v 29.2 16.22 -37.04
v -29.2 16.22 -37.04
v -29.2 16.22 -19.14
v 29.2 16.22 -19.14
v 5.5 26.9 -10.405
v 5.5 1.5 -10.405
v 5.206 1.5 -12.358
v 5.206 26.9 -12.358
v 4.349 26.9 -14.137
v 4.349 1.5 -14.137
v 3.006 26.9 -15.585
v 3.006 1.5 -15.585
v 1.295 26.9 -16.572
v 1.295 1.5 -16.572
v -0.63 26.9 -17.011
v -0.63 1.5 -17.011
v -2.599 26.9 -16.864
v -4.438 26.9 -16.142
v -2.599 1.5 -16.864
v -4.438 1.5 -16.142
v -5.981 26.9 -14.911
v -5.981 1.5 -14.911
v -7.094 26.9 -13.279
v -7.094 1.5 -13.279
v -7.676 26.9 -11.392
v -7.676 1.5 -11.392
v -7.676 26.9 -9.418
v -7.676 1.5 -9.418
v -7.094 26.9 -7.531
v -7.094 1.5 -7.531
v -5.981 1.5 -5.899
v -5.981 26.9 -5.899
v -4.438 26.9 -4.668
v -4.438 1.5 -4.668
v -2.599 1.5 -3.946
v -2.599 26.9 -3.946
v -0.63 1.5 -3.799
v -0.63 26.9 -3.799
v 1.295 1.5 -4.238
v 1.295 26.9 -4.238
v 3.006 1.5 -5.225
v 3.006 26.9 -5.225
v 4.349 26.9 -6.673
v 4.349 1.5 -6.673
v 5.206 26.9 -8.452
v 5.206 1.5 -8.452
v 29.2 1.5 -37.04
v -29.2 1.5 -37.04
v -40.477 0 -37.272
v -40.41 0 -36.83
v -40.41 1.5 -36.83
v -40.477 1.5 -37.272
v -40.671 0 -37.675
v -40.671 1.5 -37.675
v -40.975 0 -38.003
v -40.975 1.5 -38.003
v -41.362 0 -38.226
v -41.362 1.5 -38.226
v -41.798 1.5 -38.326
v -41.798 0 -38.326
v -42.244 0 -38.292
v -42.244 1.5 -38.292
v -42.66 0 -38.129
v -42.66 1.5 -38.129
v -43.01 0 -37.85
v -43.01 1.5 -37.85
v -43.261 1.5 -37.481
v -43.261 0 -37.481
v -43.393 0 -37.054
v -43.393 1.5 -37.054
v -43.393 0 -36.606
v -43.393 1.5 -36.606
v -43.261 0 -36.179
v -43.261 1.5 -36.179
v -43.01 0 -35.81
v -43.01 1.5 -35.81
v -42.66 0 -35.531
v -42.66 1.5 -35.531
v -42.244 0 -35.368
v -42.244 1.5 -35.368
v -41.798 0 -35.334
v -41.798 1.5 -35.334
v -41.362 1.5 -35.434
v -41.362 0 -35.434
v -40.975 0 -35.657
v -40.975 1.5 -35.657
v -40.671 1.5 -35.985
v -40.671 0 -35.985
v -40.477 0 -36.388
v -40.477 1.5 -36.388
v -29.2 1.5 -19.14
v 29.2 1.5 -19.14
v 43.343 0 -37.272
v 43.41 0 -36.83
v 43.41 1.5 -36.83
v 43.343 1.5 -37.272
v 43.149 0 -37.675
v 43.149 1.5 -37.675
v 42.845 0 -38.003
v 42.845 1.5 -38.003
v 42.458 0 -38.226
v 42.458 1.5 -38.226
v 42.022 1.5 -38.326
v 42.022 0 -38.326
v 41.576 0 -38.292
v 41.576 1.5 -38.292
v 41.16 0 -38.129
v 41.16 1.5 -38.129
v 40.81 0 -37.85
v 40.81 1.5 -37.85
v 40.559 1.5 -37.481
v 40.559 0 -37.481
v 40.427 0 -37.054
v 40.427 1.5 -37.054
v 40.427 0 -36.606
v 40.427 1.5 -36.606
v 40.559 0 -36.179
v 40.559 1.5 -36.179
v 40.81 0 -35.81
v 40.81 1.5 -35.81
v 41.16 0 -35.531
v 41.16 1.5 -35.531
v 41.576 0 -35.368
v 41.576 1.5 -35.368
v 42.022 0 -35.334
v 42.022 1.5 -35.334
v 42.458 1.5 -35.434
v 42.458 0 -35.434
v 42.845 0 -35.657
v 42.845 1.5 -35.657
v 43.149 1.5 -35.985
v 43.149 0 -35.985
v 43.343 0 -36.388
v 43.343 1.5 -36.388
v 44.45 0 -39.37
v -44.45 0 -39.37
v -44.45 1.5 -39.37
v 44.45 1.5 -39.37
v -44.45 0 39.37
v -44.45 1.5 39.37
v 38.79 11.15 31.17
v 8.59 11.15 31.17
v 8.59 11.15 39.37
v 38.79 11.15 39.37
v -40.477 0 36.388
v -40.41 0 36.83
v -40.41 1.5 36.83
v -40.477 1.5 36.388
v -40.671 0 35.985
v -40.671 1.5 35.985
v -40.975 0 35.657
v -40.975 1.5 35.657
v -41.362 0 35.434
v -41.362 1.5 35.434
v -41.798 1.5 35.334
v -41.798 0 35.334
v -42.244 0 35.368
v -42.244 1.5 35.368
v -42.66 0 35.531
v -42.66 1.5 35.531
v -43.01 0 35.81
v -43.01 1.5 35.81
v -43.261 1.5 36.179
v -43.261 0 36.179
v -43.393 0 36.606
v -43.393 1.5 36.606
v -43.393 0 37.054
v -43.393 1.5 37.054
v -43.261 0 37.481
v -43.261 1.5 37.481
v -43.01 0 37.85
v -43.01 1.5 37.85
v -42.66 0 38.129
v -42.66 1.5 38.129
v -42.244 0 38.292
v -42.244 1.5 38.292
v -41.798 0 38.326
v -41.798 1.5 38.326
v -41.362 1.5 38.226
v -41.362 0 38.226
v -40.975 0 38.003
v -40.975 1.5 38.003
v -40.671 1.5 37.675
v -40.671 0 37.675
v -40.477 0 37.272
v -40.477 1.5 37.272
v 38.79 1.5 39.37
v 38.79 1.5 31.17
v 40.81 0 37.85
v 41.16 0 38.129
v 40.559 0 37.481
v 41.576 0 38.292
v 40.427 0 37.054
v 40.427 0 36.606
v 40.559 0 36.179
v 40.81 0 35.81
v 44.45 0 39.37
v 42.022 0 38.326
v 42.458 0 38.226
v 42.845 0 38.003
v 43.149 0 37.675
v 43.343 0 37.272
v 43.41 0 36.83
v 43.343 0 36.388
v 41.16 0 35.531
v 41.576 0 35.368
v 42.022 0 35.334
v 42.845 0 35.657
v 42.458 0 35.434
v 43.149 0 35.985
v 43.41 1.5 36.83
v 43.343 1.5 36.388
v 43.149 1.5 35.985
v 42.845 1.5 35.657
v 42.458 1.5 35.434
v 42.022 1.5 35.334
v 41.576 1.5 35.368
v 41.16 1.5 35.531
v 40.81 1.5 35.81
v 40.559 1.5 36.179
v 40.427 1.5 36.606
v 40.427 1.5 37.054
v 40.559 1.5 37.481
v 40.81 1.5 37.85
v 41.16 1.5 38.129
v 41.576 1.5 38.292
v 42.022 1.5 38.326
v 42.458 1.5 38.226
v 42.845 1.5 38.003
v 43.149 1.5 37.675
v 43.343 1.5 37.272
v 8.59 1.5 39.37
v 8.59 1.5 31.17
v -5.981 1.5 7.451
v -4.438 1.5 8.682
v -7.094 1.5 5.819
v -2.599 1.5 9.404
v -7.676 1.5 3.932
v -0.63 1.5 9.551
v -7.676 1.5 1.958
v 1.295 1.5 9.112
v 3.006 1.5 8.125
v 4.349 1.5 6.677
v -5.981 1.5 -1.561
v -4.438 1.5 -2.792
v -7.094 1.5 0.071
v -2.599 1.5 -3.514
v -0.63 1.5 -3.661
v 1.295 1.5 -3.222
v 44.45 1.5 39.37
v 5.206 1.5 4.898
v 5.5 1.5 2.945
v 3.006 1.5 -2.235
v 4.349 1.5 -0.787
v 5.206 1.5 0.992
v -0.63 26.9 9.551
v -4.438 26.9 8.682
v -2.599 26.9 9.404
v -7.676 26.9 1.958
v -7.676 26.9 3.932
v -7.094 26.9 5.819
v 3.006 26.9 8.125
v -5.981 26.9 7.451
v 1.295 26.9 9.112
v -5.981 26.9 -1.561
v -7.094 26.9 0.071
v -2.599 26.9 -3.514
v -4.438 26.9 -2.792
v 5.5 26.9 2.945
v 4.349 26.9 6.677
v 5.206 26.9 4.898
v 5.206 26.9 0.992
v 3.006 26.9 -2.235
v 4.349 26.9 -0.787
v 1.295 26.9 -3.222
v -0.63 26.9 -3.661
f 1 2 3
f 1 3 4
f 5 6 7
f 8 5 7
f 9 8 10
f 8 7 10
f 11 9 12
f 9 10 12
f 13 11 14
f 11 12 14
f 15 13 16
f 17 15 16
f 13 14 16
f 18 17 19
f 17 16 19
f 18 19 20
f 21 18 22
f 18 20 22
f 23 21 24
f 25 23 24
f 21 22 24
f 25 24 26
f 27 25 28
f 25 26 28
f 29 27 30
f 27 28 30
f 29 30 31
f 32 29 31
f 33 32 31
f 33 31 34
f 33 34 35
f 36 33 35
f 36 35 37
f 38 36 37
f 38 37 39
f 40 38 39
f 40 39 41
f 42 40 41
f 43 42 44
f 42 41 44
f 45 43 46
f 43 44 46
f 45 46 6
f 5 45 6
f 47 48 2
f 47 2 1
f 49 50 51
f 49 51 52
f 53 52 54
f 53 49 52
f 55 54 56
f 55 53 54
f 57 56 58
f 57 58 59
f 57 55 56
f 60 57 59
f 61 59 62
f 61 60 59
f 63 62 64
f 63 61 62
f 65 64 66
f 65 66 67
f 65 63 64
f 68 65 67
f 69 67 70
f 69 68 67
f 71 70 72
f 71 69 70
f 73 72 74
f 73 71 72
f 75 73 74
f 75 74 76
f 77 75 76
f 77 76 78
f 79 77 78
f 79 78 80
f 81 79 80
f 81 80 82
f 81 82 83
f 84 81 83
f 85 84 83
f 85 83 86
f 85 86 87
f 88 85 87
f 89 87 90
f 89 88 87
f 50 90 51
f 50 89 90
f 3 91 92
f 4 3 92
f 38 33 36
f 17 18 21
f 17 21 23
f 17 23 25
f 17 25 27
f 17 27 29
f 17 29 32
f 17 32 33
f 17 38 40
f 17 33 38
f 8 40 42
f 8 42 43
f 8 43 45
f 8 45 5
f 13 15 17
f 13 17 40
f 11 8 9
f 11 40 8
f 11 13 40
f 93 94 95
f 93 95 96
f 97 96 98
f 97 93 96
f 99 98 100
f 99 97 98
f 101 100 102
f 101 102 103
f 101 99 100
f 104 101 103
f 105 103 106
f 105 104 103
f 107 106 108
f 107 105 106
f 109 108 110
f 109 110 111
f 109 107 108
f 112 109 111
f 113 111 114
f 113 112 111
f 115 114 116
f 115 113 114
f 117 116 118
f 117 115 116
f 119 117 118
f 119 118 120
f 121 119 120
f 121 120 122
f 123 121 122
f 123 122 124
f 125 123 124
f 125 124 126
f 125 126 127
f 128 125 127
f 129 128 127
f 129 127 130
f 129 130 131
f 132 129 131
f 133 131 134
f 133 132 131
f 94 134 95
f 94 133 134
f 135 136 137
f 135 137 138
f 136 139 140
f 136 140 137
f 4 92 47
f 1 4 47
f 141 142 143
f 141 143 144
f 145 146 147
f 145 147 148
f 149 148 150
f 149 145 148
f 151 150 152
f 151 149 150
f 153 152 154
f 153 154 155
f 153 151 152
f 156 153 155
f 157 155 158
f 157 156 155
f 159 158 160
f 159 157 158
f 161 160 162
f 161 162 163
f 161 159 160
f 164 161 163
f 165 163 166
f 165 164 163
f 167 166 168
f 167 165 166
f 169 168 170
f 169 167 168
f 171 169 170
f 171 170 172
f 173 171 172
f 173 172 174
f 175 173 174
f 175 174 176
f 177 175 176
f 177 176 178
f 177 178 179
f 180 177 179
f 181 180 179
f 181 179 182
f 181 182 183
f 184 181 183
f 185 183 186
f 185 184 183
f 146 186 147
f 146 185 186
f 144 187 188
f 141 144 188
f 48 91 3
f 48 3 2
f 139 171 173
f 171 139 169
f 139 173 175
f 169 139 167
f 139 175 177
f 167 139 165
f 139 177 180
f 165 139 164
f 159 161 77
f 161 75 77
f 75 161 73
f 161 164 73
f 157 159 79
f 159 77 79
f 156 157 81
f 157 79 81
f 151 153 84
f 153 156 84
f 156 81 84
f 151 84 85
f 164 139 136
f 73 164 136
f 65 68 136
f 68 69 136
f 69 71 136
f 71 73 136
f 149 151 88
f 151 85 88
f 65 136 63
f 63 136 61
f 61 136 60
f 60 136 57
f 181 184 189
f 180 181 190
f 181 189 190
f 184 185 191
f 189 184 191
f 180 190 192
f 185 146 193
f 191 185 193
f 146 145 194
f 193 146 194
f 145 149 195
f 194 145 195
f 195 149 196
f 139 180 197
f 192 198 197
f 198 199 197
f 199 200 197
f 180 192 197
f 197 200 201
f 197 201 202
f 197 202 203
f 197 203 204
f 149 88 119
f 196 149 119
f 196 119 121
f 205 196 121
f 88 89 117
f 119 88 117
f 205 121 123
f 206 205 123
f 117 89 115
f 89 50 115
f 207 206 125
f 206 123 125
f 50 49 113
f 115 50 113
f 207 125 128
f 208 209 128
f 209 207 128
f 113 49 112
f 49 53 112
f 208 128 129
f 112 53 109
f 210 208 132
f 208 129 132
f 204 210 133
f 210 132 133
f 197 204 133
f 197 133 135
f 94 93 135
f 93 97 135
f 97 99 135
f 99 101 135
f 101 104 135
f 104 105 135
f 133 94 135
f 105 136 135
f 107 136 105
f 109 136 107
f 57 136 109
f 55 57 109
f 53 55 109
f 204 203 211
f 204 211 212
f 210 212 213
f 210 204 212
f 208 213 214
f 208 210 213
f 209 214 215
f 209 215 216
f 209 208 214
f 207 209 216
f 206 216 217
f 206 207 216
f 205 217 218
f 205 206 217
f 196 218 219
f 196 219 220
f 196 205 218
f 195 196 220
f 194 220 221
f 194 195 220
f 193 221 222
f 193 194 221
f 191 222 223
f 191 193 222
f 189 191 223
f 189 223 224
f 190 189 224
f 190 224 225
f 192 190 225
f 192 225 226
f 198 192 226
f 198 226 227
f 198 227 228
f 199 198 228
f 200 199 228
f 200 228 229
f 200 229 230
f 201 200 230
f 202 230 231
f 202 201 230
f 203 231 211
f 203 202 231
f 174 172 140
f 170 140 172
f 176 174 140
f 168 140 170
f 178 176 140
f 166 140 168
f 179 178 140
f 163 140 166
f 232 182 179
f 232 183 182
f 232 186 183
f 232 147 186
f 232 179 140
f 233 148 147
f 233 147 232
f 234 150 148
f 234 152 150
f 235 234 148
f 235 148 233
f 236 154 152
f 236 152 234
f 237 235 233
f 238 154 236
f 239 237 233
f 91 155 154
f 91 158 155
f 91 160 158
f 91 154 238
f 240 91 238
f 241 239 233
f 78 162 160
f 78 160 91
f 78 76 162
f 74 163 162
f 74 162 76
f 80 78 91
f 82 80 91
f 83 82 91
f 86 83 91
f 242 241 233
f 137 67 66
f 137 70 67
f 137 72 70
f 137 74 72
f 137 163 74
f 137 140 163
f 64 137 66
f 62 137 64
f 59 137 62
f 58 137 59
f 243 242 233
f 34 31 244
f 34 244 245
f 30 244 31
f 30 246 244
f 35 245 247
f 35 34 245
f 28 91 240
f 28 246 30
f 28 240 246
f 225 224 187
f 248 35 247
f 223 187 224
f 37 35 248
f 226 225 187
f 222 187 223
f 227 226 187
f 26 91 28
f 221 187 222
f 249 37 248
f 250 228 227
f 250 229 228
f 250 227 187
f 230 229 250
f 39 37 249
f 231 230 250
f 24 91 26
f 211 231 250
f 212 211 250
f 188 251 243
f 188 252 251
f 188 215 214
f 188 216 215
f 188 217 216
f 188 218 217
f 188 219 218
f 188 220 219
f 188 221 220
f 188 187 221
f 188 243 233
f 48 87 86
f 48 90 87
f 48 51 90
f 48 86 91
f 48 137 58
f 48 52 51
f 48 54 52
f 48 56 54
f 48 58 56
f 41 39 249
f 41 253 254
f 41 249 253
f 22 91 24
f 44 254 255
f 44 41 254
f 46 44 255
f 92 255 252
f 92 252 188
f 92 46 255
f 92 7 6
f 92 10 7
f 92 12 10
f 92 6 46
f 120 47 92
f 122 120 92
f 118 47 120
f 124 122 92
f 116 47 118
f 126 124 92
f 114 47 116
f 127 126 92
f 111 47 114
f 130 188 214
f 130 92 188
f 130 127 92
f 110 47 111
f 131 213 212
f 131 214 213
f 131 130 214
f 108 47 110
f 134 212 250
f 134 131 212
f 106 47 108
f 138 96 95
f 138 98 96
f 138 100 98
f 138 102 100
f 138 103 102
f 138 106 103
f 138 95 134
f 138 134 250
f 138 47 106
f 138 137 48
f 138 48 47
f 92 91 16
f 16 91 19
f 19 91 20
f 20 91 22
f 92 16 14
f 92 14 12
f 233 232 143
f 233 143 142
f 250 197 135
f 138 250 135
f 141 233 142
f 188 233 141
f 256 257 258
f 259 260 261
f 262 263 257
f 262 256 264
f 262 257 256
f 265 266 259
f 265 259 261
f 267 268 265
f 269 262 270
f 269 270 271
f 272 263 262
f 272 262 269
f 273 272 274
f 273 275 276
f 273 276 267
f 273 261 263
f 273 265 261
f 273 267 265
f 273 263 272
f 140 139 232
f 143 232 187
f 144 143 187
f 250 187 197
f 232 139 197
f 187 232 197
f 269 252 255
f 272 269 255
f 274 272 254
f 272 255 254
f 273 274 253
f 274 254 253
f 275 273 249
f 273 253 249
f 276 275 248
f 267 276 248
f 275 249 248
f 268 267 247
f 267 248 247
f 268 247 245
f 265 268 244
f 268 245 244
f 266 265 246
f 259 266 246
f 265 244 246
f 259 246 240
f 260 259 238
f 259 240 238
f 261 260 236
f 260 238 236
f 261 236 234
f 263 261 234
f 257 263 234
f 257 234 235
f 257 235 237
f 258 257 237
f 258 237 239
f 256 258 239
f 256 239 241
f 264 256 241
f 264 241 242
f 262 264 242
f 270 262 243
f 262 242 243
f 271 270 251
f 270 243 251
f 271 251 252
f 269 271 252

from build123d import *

# Parameters (mm, degrees)
SKETCH1_W           = 88.9
SKETCH1_H           = 78.74
SKETCH1_R           = 1.5
BOSS_EXTRUDE1_DEPTH = 1.5
SKETCH2_W           = 58.4
SKETCH2_H           = 17.9
BOSS_EXTRUDE2_DEPTH = 14.72
SKETCH3_W           = 30.2
SKETCH3_H           = 8.2
BOSS_EXTRUDE3_DEPTH = 9.65
SKETCH4_R           = 6.625
BOSS_EXTRUDE6_DEPTH = 25.4


with BuildPart() as part:
    # Sketch1 → Boss-Extrude1 (new body)
    with BuildSketch(Plane(origin=(0, 0, 0), x_dir=(1, 0, 0), z_dir=(0, 1, 0))):
        Rectangle(SKETCH1_W, SKETCH1_H)
        with Locations((-41.91, 36.83)):
            Circle(SKETCH1_R, mode=Mode.SUBTRACT)
        with Locations((41.91, 36.83)):
            Circle(SKETCH1_R, mode=Mode.SUBTRACT)
        with Locations((41.91, -36.83)):
            Circle(SKETCH1_R, mode=Mode.SUBTRACT)
        with Locations((-41.91, -36.83)):
            Circle(SKETCH1_R, mode=Mode.SUBTRACT)
    extrude(amount=BOSS_EXTRUDE1_DEPTH)

    # Sketch2 → Boss-Extrude2 (add)
    with BuildSketch(Plane(origin=(0, 1.5, 0), x_dir=(1, 0, 0), z_dir=(0, 1, 0))):
        with Locations((0, 28.09)):
            Rectangle(SKETCH2_W, SKETCH2_H)
    extrude(amount=BOSS_EXTRUDE2_DEPTH)

    # Sketch3 → Boss-Extrude3 (add)
    with BuildSketch(Plane(origin=(0, 1.5, 0), x_dir=(1, 0, 0), z_dir=(0, 1, 0))):
        with Locations((23.69, -35.27)):
            Rectangle(SKETCH3_W, SKETCH3_H)
    extrude(amount=BOSS_EXTRUDE3_DEPTH)

    # Sketch4 → Boss-Extrude6 (add)
    with BuildSketch(Plane(origin=(0, 1.5, 0), x_dir=(1, 0, 0), z_dir=(0, 1, 0))):
        with Locations((-1.125, 10.405)):
            Circle(SKETCH4_R)
        with Locations((-1.125, -2.945)):
            Circle(SKETCH4_R)
    extrude(amount=BOSS_EXTRUDE6_DEPTH)


solid = part.part
